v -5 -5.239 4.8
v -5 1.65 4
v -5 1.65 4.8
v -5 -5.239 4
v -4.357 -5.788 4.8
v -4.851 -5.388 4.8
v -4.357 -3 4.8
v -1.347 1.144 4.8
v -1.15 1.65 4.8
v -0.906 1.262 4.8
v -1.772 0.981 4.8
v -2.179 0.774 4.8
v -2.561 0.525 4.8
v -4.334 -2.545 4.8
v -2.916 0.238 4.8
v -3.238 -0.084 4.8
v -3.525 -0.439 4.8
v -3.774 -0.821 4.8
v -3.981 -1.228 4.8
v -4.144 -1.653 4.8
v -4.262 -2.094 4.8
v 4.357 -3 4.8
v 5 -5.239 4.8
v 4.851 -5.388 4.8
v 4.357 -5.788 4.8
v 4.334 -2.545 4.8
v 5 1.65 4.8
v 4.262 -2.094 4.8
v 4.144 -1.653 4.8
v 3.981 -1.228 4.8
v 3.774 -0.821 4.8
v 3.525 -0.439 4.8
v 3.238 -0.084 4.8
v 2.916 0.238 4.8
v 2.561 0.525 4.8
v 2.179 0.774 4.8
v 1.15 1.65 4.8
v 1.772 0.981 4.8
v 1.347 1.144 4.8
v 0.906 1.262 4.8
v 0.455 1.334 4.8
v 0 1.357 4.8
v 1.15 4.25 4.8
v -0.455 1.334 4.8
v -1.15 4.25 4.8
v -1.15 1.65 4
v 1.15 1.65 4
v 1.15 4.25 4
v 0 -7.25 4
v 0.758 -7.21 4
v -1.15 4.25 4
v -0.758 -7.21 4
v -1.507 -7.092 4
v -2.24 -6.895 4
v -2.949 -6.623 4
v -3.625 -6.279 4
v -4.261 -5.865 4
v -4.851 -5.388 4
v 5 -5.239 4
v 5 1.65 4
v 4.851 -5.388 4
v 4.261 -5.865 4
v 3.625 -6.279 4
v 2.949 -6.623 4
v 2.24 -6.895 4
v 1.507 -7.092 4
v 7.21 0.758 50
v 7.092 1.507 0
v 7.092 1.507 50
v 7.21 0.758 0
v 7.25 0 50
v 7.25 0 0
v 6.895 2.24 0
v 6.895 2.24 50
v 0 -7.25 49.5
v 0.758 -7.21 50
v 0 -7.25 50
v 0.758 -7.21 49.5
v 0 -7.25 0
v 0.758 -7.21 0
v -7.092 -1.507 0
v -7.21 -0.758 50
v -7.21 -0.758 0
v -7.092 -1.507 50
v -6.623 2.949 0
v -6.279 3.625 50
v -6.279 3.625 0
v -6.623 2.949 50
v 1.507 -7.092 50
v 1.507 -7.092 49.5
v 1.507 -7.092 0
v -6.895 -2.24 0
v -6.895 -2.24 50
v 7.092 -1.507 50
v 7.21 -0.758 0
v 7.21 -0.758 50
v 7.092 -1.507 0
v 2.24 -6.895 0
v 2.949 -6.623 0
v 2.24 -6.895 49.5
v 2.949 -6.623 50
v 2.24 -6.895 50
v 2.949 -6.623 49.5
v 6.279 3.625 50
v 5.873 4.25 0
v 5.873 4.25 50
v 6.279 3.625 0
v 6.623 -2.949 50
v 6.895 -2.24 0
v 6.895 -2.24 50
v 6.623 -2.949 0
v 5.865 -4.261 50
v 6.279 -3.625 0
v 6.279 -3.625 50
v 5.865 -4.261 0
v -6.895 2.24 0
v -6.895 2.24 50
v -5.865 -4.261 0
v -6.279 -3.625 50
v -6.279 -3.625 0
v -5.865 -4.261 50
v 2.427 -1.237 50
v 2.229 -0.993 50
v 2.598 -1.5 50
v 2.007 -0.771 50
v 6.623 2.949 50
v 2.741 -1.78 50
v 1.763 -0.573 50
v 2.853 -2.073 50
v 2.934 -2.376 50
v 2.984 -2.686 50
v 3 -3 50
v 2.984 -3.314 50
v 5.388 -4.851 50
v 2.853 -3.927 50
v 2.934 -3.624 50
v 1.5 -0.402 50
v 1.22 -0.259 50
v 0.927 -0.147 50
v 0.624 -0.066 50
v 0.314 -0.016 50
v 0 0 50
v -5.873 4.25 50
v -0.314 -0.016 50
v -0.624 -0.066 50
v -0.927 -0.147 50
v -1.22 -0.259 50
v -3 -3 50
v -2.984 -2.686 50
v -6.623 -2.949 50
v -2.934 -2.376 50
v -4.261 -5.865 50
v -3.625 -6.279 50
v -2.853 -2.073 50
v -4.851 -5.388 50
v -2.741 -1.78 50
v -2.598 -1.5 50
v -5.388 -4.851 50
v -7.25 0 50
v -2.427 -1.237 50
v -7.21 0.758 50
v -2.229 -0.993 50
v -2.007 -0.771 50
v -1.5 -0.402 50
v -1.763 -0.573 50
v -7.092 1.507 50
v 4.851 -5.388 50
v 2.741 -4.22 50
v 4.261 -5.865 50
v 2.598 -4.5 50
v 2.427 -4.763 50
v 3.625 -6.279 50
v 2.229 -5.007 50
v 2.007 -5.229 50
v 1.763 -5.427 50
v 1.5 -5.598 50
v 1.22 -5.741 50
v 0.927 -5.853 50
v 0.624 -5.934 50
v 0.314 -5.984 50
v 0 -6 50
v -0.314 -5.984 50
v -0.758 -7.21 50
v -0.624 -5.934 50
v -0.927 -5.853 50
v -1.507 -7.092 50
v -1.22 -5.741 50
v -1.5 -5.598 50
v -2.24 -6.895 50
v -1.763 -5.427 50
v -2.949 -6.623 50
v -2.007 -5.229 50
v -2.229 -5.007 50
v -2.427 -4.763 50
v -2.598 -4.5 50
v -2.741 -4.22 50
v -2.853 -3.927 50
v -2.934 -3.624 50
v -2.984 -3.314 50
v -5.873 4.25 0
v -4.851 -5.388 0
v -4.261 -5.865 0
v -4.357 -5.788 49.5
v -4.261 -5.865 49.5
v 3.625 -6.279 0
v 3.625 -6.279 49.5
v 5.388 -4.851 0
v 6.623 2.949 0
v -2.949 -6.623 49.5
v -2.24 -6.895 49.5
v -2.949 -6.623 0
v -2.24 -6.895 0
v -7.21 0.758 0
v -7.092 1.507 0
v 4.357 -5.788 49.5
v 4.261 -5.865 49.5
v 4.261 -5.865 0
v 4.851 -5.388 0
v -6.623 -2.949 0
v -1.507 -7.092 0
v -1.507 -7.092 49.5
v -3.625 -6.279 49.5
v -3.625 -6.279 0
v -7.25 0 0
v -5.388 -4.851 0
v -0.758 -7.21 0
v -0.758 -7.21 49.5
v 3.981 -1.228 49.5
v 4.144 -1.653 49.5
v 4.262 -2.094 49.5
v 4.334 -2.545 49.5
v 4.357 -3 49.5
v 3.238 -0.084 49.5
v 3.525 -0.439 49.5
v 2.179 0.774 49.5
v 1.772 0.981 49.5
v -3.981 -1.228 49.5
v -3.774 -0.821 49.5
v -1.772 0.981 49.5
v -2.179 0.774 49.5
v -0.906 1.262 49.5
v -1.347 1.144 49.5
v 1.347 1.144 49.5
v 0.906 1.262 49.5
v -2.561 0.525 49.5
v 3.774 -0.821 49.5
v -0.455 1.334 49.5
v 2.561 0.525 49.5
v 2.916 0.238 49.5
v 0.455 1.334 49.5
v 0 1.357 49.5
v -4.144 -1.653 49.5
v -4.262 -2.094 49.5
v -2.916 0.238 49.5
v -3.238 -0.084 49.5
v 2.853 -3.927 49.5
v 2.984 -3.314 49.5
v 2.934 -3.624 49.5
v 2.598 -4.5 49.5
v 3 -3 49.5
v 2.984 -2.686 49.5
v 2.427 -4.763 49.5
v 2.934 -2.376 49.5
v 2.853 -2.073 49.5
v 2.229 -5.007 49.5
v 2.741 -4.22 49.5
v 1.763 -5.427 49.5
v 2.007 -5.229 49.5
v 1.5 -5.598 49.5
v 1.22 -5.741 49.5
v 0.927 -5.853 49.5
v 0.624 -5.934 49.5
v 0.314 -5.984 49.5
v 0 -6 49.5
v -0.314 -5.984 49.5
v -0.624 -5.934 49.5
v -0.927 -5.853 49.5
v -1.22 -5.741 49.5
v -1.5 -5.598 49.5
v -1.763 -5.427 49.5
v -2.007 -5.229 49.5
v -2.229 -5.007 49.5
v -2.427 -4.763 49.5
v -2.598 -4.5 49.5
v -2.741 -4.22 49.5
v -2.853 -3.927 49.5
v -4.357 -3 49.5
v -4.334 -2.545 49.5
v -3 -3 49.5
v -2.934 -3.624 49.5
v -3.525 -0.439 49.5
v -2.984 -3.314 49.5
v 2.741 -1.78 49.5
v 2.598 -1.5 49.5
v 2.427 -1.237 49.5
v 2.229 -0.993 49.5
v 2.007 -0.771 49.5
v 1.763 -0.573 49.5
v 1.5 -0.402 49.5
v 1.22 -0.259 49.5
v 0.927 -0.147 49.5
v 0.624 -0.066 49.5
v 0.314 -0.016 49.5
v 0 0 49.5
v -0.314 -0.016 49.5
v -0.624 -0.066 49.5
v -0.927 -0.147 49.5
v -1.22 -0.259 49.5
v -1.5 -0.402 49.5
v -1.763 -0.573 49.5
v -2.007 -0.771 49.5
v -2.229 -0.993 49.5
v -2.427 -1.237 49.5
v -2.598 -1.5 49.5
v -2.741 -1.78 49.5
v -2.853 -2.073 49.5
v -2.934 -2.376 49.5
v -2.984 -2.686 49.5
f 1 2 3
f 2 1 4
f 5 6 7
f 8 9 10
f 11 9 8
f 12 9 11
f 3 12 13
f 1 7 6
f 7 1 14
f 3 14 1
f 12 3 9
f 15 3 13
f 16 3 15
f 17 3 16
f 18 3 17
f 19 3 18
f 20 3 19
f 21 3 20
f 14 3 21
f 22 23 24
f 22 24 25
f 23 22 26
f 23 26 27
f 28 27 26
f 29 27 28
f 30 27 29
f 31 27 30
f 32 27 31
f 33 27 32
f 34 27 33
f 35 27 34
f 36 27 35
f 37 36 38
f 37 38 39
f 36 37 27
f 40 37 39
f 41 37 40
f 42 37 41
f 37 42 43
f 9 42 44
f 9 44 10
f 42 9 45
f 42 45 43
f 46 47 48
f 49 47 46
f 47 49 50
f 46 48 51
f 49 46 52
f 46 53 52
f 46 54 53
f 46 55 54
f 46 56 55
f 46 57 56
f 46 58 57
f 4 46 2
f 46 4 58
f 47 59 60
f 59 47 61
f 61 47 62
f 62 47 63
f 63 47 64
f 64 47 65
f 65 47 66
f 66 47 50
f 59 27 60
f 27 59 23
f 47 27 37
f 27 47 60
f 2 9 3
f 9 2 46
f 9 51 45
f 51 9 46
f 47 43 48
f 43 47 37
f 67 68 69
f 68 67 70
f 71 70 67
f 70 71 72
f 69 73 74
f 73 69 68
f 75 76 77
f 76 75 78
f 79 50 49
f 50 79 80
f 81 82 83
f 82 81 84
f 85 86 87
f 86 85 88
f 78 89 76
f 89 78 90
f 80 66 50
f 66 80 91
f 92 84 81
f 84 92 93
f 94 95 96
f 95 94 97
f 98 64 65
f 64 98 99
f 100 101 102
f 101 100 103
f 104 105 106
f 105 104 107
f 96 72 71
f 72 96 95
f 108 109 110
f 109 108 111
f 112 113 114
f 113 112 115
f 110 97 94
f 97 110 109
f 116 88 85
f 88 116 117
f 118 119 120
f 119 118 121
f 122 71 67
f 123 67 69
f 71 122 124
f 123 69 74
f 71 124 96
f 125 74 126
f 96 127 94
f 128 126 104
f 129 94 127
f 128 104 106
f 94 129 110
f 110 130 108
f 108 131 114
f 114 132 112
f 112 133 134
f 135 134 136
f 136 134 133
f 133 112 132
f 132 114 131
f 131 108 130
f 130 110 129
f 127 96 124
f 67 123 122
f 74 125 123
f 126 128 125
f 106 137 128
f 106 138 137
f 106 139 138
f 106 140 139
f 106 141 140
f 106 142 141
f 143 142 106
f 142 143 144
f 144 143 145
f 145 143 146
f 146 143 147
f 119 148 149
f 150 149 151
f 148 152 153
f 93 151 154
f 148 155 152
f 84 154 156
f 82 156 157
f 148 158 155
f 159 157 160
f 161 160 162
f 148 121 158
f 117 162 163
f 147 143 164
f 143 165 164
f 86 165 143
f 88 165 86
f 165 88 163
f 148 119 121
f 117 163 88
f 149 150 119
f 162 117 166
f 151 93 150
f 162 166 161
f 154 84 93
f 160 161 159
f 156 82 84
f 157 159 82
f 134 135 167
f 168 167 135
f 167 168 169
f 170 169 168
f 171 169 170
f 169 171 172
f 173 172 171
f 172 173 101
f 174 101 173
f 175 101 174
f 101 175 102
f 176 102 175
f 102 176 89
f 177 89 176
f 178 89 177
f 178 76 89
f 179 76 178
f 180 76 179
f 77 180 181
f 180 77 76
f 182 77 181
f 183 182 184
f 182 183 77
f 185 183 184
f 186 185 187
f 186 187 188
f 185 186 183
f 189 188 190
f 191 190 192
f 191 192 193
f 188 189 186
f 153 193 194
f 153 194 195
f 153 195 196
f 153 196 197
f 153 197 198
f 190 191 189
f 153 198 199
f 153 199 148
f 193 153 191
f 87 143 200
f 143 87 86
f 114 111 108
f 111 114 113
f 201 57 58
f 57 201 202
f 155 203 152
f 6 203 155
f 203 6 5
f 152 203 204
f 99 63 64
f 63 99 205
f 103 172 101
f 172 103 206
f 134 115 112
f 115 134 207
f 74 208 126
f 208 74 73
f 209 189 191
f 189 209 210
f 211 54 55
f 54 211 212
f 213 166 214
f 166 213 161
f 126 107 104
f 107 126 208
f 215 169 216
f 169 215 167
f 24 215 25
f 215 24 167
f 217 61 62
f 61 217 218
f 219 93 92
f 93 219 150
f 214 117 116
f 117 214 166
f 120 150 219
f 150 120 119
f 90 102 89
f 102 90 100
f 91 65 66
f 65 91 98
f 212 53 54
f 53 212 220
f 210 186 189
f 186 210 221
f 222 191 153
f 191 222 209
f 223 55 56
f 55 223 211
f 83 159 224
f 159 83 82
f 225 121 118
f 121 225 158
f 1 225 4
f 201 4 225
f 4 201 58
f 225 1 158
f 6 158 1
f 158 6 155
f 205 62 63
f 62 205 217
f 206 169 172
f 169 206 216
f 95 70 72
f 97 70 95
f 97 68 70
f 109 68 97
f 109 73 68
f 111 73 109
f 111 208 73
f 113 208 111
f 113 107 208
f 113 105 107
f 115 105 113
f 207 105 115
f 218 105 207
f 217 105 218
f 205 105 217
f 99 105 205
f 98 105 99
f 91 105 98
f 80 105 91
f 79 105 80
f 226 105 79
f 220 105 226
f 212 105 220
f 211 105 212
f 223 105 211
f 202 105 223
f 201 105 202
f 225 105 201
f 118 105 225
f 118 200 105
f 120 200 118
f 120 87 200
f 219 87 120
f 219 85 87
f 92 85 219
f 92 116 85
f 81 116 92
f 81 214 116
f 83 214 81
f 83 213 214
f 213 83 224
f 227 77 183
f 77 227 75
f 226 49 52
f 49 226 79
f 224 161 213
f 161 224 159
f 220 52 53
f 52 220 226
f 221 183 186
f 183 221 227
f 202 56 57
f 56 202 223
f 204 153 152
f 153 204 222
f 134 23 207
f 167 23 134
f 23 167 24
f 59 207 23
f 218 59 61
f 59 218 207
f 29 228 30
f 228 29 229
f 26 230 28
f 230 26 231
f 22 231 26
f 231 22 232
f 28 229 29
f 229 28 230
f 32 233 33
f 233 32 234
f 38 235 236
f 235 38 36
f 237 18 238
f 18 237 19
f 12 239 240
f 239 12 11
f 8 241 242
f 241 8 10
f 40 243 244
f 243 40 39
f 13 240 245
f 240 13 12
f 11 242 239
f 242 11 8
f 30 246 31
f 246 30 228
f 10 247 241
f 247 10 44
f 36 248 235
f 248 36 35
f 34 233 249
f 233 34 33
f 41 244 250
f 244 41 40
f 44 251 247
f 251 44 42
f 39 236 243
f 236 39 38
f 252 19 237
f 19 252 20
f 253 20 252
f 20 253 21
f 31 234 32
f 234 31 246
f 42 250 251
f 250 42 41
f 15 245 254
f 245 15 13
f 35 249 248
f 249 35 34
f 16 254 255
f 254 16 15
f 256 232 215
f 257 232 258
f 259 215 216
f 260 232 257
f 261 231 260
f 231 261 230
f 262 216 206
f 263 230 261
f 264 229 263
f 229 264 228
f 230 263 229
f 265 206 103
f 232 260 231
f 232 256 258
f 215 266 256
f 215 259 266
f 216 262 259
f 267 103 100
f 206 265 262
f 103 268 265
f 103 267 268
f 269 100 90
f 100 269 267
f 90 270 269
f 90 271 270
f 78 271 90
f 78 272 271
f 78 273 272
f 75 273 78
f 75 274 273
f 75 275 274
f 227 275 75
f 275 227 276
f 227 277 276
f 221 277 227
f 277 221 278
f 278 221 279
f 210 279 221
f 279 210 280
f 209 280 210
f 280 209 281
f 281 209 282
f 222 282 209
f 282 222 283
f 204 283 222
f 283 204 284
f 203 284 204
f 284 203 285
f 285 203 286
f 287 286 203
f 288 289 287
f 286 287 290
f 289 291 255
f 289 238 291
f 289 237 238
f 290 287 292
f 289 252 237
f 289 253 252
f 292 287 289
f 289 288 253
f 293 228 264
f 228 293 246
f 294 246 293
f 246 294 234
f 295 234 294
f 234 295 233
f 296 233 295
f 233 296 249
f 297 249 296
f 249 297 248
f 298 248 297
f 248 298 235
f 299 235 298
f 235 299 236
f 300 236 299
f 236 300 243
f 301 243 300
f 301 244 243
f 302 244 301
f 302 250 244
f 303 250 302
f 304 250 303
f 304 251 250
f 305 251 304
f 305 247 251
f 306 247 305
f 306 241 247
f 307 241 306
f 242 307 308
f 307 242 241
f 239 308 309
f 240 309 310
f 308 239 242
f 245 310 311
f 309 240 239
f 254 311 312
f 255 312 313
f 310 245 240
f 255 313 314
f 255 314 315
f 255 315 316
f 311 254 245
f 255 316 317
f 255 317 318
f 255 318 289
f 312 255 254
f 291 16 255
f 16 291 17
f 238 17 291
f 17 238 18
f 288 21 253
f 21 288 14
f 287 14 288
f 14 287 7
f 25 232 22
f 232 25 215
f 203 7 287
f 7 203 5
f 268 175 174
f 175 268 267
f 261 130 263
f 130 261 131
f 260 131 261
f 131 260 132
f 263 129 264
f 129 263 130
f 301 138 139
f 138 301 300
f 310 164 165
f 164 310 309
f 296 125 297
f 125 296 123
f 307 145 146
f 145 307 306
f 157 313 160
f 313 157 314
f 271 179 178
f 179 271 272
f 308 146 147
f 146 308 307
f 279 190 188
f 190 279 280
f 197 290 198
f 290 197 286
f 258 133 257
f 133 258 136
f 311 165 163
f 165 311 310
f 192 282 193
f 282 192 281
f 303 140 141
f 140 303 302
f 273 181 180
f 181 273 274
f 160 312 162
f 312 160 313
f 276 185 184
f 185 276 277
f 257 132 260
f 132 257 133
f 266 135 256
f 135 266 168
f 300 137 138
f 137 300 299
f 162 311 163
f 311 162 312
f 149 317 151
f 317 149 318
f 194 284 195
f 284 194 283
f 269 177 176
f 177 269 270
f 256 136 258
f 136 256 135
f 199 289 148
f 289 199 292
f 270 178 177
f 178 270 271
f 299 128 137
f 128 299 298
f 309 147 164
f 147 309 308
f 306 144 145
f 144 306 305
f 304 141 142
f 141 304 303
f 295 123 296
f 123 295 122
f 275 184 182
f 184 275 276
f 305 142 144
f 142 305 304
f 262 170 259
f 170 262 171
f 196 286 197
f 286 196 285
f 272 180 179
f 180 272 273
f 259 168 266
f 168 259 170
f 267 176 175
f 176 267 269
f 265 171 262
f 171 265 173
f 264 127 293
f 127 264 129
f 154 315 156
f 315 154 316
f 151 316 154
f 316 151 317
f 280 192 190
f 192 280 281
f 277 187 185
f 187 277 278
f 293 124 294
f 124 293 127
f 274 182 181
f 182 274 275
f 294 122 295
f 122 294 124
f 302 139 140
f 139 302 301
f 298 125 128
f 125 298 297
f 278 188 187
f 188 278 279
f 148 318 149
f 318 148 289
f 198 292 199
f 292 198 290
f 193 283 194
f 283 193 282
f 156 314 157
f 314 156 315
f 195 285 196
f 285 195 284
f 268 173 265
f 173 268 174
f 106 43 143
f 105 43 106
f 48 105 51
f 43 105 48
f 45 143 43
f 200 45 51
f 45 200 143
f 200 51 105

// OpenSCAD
include <BOSL/constants.scad>
use <BOSL/shapes.scad>
use <BOSL/transforms.scad>

//positive terminal minimum 1.0mm (included in height) -- max 5.5mm
//negative terminal minimum diameter 7mm
hAA=50;
dAA=14+0.5;

compressedSpring = 2.5;
hAAAA=42.5+compressedSpring; 
dAAAA=8.3*1.05; // 105% 

//Metal Battery Spring Terminals
//additions are for "wiggle room"
slotWidthX = 9.7 + 0.3;
slotDepthY=9.0 + 0.3;
slotThicknessZ=0.40 + 0.40; // metal tab only -- does not count negative spring or positive bump!
tabWidthX=2.3;
tabDepthY=6.0;
tabOffset=0; // in degrees 

//General variables
$fn=60; //circle smoothness
overlap = 1.00; // overlap ensures that subtractions go beyond the edges

topThickness = 0.5;
shiftForward=3;


difference() {

  AA();

  forward(shiftForward) up(hAA-hAAAA-topThickness) #AAAA();
  forward(shiftForward) up(hAA-hAAAA-topThickness) forward(dAAAA/2) AAAAopening();

  //Positive pole hole
  forward(shiftForward) up(hAA-topThickness) color("green") cyl(d=6, h=topThickness*2, align=V_UP); // hole at top for battery positive to poke through at

  //spring insert for negative pole of battery
  forward(shiftForward) up(hAA-hAAAA-0.2-slotThicknessZ) zrot(180-tabOffset) slot();
  
  //up(hAA-hAAAA-3-slotThicknessZ) zrot(tabOffset) xrot(180) slot();  
  //up(hAA-hAAAA-3-slotThicknessZ) zrot(tabOffset) xrot(180) slotopening();  
  
  
  //Flatten holder
  back((dAA/2)-shiftForward+(3/2)) color("gray") cuboid([dAA, 3, hAA], align=V_UP); //flatten back
  //forward((dAA/2)+0.25) color("gray") cuboid([dAA, 2, hAA], align=V_UP); //flatten front
}
  
 //preview
 //up(hAA+10)   slot();

module AA() { 
  color("orange") cyl(d=dAA, h=hAA, align=V_UP); 
}

module AAAA() { 
  color("gold") cyl(d=dAAAA, h=hAAAA, align=V_UP); 
}

module AAAAopening() { 
  color("khaki") cuboid([dAAAA, dAAAA , hAAAA], align=V_UP); 
}


module slot() { 
  color("magenta") cuboid([slotWidthX, slotDepthY, slotThicknessZ], align=V_UP);
  color("deeppink") cyl(d=6, h=slotThicknessZ+1.6, align=V_UP);
  forward((slotDepthY/2)+(tabDepthY/2)) color("hotpink") cuboid([tabWidthX, tabDepthY, slotThicknessZ], align=V_UP);
}

module slotopening() {
  forward(dAA/2) color("pink") cuboid([slotWidthX, dAA, slotThicknessZ], align=V_UP);
  forward(dAA/2) color("lightpink") cuboid([6, dAA, slotThicknessZ+1.6], align=V_UP);
}
